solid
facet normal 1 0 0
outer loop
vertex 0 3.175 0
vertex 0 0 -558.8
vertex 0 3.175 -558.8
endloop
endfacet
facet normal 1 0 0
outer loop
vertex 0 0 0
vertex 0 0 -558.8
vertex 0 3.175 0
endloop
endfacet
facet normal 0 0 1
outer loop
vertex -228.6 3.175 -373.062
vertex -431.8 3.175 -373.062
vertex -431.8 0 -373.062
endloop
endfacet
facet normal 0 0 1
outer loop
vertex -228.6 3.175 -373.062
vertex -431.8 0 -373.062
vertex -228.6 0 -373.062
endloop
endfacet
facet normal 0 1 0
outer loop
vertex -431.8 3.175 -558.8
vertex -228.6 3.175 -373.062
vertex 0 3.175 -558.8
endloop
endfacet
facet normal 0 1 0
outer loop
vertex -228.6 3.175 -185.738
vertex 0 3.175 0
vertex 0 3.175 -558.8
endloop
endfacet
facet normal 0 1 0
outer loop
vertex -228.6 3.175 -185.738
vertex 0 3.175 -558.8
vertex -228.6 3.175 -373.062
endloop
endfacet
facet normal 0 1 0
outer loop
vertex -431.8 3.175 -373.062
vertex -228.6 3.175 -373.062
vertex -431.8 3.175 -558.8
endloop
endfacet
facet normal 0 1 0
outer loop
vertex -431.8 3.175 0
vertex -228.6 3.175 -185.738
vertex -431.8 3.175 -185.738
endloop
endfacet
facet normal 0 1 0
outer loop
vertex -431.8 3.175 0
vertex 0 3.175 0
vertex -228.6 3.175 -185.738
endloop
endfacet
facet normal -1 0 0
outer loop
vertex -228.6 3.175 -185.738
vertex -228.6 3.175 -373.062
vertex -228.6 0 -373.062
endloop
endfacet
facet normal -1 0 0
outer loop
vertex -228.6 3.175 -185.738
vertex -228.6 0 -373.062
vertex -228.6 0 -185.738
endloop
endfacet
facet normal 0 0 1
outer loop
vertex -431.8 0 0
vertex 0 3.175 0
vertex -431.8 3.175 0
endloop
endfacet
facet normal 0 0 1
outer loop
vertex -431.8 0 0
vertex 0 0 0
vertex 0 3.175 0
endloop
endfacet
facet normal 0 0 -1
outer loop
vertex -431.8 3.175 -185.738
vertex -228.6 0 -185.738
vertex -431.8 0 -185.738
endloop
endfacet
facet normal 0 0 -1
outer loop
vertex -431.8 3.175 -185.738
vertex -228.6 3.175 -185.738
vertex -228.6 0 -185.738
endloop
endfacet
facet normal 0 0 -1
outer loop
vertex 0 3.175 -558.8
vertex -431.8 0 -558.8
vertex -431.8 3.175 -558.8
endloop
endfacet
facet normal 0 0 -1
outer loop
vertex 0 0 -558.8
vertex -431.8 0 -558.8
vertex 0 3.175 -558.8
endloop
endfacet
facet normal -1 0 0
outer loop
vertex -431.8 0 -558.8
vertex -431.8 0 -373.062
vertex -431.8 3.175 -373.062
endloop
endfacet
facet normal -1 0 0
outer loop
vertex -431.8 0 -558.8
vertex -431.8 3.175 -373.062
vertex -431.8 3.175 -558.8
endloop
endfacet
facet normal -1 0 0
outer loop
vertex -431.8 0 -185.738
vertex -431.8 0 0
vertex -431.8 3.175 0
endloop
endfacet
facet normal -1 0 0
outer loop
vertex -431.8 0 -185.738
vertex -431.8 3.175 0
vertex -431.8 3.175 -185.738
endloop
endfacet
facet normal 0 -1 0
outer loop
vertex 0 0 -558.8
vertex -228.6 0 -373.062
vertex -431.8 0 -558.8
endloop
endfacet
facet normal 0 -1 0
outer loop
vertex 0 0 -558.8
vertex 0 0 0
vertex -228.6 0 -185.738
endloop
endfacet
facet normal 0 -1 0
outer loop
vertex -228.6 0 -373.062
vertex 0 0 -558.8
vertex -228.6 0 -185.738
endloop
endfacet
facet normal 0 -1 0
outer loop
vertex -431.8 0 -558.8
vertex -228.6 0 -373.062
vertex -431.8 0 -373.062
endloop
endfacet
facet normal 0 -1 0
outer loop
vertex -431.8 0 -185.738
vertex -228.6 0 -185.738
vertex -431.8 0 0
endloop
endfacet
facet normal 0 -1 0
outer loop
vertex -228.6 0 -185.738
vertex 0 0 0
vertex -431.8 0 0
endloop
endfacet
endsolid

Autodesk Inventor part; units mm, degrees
ref_plane "YZ Plane" through (0, 0, 0) normal (1, 0, 0) x (0, 1, 0)
ref_plane "XZ Plane" through (0, 0, 0) normal (0, 1, 0) x (-1, 0, 0)
ref_plane "XY Plane" through (0, 0, 0) normal (0, 0, 1) x (1, 0, 0)
sketch "Sketch1" plane through (0, 0, 0) normal (0, 1, 0) x (-1, 0, 0)
  line L0 (0, 0) -> (431.8, 0)
  line L1 (431.8, 0) -> (431.8, -558.8)
  line L2 (431.8, -558.8) -> (0, -558.8)
  line L3 (0, -558.8) -> (0, 0)
  dimension "d0" = 431.8
  dimension "d1" = 558.8
extrude "Extrusion1" add sketch "Sketch1" along normal blind 3.175
sketch "Sketch3" plane through (0, 3.175, 0) normal (0, 1, 0) x (1, 0, 0)
  line L0 (0, 0) -> (0, 558.8) projected
  line L1 (0, 327.1063) -> (0, 139.7813)
  line L2 (-431.8, 558.8) -> (-431.8, 0) projected
  line L3 (-431.8, 373.0625) -> (-228.6, 373.0625)
  line L4 (-228.6, 373.0625) -> (-228.6, 185.7375)
  line L5 (-228.6, 185.7375) -> (-431.8, 185.7375)
  line L6 (-431.8, 185.7375) -> (-431.8, 373.0625)
  point P0 (-228.6, 279.4)
  point P1 (-431.8, 279.4)
  dimension "d8" = 187.325
  dimension "d9" = 203.2
extrude "Extrusion3" cut sketch "Sketch3" against normal up to surface (3.175 mm away)
properties part number "ElectricalBoard.ver1-1111-2019" material "Polycarbonate, Clear"
